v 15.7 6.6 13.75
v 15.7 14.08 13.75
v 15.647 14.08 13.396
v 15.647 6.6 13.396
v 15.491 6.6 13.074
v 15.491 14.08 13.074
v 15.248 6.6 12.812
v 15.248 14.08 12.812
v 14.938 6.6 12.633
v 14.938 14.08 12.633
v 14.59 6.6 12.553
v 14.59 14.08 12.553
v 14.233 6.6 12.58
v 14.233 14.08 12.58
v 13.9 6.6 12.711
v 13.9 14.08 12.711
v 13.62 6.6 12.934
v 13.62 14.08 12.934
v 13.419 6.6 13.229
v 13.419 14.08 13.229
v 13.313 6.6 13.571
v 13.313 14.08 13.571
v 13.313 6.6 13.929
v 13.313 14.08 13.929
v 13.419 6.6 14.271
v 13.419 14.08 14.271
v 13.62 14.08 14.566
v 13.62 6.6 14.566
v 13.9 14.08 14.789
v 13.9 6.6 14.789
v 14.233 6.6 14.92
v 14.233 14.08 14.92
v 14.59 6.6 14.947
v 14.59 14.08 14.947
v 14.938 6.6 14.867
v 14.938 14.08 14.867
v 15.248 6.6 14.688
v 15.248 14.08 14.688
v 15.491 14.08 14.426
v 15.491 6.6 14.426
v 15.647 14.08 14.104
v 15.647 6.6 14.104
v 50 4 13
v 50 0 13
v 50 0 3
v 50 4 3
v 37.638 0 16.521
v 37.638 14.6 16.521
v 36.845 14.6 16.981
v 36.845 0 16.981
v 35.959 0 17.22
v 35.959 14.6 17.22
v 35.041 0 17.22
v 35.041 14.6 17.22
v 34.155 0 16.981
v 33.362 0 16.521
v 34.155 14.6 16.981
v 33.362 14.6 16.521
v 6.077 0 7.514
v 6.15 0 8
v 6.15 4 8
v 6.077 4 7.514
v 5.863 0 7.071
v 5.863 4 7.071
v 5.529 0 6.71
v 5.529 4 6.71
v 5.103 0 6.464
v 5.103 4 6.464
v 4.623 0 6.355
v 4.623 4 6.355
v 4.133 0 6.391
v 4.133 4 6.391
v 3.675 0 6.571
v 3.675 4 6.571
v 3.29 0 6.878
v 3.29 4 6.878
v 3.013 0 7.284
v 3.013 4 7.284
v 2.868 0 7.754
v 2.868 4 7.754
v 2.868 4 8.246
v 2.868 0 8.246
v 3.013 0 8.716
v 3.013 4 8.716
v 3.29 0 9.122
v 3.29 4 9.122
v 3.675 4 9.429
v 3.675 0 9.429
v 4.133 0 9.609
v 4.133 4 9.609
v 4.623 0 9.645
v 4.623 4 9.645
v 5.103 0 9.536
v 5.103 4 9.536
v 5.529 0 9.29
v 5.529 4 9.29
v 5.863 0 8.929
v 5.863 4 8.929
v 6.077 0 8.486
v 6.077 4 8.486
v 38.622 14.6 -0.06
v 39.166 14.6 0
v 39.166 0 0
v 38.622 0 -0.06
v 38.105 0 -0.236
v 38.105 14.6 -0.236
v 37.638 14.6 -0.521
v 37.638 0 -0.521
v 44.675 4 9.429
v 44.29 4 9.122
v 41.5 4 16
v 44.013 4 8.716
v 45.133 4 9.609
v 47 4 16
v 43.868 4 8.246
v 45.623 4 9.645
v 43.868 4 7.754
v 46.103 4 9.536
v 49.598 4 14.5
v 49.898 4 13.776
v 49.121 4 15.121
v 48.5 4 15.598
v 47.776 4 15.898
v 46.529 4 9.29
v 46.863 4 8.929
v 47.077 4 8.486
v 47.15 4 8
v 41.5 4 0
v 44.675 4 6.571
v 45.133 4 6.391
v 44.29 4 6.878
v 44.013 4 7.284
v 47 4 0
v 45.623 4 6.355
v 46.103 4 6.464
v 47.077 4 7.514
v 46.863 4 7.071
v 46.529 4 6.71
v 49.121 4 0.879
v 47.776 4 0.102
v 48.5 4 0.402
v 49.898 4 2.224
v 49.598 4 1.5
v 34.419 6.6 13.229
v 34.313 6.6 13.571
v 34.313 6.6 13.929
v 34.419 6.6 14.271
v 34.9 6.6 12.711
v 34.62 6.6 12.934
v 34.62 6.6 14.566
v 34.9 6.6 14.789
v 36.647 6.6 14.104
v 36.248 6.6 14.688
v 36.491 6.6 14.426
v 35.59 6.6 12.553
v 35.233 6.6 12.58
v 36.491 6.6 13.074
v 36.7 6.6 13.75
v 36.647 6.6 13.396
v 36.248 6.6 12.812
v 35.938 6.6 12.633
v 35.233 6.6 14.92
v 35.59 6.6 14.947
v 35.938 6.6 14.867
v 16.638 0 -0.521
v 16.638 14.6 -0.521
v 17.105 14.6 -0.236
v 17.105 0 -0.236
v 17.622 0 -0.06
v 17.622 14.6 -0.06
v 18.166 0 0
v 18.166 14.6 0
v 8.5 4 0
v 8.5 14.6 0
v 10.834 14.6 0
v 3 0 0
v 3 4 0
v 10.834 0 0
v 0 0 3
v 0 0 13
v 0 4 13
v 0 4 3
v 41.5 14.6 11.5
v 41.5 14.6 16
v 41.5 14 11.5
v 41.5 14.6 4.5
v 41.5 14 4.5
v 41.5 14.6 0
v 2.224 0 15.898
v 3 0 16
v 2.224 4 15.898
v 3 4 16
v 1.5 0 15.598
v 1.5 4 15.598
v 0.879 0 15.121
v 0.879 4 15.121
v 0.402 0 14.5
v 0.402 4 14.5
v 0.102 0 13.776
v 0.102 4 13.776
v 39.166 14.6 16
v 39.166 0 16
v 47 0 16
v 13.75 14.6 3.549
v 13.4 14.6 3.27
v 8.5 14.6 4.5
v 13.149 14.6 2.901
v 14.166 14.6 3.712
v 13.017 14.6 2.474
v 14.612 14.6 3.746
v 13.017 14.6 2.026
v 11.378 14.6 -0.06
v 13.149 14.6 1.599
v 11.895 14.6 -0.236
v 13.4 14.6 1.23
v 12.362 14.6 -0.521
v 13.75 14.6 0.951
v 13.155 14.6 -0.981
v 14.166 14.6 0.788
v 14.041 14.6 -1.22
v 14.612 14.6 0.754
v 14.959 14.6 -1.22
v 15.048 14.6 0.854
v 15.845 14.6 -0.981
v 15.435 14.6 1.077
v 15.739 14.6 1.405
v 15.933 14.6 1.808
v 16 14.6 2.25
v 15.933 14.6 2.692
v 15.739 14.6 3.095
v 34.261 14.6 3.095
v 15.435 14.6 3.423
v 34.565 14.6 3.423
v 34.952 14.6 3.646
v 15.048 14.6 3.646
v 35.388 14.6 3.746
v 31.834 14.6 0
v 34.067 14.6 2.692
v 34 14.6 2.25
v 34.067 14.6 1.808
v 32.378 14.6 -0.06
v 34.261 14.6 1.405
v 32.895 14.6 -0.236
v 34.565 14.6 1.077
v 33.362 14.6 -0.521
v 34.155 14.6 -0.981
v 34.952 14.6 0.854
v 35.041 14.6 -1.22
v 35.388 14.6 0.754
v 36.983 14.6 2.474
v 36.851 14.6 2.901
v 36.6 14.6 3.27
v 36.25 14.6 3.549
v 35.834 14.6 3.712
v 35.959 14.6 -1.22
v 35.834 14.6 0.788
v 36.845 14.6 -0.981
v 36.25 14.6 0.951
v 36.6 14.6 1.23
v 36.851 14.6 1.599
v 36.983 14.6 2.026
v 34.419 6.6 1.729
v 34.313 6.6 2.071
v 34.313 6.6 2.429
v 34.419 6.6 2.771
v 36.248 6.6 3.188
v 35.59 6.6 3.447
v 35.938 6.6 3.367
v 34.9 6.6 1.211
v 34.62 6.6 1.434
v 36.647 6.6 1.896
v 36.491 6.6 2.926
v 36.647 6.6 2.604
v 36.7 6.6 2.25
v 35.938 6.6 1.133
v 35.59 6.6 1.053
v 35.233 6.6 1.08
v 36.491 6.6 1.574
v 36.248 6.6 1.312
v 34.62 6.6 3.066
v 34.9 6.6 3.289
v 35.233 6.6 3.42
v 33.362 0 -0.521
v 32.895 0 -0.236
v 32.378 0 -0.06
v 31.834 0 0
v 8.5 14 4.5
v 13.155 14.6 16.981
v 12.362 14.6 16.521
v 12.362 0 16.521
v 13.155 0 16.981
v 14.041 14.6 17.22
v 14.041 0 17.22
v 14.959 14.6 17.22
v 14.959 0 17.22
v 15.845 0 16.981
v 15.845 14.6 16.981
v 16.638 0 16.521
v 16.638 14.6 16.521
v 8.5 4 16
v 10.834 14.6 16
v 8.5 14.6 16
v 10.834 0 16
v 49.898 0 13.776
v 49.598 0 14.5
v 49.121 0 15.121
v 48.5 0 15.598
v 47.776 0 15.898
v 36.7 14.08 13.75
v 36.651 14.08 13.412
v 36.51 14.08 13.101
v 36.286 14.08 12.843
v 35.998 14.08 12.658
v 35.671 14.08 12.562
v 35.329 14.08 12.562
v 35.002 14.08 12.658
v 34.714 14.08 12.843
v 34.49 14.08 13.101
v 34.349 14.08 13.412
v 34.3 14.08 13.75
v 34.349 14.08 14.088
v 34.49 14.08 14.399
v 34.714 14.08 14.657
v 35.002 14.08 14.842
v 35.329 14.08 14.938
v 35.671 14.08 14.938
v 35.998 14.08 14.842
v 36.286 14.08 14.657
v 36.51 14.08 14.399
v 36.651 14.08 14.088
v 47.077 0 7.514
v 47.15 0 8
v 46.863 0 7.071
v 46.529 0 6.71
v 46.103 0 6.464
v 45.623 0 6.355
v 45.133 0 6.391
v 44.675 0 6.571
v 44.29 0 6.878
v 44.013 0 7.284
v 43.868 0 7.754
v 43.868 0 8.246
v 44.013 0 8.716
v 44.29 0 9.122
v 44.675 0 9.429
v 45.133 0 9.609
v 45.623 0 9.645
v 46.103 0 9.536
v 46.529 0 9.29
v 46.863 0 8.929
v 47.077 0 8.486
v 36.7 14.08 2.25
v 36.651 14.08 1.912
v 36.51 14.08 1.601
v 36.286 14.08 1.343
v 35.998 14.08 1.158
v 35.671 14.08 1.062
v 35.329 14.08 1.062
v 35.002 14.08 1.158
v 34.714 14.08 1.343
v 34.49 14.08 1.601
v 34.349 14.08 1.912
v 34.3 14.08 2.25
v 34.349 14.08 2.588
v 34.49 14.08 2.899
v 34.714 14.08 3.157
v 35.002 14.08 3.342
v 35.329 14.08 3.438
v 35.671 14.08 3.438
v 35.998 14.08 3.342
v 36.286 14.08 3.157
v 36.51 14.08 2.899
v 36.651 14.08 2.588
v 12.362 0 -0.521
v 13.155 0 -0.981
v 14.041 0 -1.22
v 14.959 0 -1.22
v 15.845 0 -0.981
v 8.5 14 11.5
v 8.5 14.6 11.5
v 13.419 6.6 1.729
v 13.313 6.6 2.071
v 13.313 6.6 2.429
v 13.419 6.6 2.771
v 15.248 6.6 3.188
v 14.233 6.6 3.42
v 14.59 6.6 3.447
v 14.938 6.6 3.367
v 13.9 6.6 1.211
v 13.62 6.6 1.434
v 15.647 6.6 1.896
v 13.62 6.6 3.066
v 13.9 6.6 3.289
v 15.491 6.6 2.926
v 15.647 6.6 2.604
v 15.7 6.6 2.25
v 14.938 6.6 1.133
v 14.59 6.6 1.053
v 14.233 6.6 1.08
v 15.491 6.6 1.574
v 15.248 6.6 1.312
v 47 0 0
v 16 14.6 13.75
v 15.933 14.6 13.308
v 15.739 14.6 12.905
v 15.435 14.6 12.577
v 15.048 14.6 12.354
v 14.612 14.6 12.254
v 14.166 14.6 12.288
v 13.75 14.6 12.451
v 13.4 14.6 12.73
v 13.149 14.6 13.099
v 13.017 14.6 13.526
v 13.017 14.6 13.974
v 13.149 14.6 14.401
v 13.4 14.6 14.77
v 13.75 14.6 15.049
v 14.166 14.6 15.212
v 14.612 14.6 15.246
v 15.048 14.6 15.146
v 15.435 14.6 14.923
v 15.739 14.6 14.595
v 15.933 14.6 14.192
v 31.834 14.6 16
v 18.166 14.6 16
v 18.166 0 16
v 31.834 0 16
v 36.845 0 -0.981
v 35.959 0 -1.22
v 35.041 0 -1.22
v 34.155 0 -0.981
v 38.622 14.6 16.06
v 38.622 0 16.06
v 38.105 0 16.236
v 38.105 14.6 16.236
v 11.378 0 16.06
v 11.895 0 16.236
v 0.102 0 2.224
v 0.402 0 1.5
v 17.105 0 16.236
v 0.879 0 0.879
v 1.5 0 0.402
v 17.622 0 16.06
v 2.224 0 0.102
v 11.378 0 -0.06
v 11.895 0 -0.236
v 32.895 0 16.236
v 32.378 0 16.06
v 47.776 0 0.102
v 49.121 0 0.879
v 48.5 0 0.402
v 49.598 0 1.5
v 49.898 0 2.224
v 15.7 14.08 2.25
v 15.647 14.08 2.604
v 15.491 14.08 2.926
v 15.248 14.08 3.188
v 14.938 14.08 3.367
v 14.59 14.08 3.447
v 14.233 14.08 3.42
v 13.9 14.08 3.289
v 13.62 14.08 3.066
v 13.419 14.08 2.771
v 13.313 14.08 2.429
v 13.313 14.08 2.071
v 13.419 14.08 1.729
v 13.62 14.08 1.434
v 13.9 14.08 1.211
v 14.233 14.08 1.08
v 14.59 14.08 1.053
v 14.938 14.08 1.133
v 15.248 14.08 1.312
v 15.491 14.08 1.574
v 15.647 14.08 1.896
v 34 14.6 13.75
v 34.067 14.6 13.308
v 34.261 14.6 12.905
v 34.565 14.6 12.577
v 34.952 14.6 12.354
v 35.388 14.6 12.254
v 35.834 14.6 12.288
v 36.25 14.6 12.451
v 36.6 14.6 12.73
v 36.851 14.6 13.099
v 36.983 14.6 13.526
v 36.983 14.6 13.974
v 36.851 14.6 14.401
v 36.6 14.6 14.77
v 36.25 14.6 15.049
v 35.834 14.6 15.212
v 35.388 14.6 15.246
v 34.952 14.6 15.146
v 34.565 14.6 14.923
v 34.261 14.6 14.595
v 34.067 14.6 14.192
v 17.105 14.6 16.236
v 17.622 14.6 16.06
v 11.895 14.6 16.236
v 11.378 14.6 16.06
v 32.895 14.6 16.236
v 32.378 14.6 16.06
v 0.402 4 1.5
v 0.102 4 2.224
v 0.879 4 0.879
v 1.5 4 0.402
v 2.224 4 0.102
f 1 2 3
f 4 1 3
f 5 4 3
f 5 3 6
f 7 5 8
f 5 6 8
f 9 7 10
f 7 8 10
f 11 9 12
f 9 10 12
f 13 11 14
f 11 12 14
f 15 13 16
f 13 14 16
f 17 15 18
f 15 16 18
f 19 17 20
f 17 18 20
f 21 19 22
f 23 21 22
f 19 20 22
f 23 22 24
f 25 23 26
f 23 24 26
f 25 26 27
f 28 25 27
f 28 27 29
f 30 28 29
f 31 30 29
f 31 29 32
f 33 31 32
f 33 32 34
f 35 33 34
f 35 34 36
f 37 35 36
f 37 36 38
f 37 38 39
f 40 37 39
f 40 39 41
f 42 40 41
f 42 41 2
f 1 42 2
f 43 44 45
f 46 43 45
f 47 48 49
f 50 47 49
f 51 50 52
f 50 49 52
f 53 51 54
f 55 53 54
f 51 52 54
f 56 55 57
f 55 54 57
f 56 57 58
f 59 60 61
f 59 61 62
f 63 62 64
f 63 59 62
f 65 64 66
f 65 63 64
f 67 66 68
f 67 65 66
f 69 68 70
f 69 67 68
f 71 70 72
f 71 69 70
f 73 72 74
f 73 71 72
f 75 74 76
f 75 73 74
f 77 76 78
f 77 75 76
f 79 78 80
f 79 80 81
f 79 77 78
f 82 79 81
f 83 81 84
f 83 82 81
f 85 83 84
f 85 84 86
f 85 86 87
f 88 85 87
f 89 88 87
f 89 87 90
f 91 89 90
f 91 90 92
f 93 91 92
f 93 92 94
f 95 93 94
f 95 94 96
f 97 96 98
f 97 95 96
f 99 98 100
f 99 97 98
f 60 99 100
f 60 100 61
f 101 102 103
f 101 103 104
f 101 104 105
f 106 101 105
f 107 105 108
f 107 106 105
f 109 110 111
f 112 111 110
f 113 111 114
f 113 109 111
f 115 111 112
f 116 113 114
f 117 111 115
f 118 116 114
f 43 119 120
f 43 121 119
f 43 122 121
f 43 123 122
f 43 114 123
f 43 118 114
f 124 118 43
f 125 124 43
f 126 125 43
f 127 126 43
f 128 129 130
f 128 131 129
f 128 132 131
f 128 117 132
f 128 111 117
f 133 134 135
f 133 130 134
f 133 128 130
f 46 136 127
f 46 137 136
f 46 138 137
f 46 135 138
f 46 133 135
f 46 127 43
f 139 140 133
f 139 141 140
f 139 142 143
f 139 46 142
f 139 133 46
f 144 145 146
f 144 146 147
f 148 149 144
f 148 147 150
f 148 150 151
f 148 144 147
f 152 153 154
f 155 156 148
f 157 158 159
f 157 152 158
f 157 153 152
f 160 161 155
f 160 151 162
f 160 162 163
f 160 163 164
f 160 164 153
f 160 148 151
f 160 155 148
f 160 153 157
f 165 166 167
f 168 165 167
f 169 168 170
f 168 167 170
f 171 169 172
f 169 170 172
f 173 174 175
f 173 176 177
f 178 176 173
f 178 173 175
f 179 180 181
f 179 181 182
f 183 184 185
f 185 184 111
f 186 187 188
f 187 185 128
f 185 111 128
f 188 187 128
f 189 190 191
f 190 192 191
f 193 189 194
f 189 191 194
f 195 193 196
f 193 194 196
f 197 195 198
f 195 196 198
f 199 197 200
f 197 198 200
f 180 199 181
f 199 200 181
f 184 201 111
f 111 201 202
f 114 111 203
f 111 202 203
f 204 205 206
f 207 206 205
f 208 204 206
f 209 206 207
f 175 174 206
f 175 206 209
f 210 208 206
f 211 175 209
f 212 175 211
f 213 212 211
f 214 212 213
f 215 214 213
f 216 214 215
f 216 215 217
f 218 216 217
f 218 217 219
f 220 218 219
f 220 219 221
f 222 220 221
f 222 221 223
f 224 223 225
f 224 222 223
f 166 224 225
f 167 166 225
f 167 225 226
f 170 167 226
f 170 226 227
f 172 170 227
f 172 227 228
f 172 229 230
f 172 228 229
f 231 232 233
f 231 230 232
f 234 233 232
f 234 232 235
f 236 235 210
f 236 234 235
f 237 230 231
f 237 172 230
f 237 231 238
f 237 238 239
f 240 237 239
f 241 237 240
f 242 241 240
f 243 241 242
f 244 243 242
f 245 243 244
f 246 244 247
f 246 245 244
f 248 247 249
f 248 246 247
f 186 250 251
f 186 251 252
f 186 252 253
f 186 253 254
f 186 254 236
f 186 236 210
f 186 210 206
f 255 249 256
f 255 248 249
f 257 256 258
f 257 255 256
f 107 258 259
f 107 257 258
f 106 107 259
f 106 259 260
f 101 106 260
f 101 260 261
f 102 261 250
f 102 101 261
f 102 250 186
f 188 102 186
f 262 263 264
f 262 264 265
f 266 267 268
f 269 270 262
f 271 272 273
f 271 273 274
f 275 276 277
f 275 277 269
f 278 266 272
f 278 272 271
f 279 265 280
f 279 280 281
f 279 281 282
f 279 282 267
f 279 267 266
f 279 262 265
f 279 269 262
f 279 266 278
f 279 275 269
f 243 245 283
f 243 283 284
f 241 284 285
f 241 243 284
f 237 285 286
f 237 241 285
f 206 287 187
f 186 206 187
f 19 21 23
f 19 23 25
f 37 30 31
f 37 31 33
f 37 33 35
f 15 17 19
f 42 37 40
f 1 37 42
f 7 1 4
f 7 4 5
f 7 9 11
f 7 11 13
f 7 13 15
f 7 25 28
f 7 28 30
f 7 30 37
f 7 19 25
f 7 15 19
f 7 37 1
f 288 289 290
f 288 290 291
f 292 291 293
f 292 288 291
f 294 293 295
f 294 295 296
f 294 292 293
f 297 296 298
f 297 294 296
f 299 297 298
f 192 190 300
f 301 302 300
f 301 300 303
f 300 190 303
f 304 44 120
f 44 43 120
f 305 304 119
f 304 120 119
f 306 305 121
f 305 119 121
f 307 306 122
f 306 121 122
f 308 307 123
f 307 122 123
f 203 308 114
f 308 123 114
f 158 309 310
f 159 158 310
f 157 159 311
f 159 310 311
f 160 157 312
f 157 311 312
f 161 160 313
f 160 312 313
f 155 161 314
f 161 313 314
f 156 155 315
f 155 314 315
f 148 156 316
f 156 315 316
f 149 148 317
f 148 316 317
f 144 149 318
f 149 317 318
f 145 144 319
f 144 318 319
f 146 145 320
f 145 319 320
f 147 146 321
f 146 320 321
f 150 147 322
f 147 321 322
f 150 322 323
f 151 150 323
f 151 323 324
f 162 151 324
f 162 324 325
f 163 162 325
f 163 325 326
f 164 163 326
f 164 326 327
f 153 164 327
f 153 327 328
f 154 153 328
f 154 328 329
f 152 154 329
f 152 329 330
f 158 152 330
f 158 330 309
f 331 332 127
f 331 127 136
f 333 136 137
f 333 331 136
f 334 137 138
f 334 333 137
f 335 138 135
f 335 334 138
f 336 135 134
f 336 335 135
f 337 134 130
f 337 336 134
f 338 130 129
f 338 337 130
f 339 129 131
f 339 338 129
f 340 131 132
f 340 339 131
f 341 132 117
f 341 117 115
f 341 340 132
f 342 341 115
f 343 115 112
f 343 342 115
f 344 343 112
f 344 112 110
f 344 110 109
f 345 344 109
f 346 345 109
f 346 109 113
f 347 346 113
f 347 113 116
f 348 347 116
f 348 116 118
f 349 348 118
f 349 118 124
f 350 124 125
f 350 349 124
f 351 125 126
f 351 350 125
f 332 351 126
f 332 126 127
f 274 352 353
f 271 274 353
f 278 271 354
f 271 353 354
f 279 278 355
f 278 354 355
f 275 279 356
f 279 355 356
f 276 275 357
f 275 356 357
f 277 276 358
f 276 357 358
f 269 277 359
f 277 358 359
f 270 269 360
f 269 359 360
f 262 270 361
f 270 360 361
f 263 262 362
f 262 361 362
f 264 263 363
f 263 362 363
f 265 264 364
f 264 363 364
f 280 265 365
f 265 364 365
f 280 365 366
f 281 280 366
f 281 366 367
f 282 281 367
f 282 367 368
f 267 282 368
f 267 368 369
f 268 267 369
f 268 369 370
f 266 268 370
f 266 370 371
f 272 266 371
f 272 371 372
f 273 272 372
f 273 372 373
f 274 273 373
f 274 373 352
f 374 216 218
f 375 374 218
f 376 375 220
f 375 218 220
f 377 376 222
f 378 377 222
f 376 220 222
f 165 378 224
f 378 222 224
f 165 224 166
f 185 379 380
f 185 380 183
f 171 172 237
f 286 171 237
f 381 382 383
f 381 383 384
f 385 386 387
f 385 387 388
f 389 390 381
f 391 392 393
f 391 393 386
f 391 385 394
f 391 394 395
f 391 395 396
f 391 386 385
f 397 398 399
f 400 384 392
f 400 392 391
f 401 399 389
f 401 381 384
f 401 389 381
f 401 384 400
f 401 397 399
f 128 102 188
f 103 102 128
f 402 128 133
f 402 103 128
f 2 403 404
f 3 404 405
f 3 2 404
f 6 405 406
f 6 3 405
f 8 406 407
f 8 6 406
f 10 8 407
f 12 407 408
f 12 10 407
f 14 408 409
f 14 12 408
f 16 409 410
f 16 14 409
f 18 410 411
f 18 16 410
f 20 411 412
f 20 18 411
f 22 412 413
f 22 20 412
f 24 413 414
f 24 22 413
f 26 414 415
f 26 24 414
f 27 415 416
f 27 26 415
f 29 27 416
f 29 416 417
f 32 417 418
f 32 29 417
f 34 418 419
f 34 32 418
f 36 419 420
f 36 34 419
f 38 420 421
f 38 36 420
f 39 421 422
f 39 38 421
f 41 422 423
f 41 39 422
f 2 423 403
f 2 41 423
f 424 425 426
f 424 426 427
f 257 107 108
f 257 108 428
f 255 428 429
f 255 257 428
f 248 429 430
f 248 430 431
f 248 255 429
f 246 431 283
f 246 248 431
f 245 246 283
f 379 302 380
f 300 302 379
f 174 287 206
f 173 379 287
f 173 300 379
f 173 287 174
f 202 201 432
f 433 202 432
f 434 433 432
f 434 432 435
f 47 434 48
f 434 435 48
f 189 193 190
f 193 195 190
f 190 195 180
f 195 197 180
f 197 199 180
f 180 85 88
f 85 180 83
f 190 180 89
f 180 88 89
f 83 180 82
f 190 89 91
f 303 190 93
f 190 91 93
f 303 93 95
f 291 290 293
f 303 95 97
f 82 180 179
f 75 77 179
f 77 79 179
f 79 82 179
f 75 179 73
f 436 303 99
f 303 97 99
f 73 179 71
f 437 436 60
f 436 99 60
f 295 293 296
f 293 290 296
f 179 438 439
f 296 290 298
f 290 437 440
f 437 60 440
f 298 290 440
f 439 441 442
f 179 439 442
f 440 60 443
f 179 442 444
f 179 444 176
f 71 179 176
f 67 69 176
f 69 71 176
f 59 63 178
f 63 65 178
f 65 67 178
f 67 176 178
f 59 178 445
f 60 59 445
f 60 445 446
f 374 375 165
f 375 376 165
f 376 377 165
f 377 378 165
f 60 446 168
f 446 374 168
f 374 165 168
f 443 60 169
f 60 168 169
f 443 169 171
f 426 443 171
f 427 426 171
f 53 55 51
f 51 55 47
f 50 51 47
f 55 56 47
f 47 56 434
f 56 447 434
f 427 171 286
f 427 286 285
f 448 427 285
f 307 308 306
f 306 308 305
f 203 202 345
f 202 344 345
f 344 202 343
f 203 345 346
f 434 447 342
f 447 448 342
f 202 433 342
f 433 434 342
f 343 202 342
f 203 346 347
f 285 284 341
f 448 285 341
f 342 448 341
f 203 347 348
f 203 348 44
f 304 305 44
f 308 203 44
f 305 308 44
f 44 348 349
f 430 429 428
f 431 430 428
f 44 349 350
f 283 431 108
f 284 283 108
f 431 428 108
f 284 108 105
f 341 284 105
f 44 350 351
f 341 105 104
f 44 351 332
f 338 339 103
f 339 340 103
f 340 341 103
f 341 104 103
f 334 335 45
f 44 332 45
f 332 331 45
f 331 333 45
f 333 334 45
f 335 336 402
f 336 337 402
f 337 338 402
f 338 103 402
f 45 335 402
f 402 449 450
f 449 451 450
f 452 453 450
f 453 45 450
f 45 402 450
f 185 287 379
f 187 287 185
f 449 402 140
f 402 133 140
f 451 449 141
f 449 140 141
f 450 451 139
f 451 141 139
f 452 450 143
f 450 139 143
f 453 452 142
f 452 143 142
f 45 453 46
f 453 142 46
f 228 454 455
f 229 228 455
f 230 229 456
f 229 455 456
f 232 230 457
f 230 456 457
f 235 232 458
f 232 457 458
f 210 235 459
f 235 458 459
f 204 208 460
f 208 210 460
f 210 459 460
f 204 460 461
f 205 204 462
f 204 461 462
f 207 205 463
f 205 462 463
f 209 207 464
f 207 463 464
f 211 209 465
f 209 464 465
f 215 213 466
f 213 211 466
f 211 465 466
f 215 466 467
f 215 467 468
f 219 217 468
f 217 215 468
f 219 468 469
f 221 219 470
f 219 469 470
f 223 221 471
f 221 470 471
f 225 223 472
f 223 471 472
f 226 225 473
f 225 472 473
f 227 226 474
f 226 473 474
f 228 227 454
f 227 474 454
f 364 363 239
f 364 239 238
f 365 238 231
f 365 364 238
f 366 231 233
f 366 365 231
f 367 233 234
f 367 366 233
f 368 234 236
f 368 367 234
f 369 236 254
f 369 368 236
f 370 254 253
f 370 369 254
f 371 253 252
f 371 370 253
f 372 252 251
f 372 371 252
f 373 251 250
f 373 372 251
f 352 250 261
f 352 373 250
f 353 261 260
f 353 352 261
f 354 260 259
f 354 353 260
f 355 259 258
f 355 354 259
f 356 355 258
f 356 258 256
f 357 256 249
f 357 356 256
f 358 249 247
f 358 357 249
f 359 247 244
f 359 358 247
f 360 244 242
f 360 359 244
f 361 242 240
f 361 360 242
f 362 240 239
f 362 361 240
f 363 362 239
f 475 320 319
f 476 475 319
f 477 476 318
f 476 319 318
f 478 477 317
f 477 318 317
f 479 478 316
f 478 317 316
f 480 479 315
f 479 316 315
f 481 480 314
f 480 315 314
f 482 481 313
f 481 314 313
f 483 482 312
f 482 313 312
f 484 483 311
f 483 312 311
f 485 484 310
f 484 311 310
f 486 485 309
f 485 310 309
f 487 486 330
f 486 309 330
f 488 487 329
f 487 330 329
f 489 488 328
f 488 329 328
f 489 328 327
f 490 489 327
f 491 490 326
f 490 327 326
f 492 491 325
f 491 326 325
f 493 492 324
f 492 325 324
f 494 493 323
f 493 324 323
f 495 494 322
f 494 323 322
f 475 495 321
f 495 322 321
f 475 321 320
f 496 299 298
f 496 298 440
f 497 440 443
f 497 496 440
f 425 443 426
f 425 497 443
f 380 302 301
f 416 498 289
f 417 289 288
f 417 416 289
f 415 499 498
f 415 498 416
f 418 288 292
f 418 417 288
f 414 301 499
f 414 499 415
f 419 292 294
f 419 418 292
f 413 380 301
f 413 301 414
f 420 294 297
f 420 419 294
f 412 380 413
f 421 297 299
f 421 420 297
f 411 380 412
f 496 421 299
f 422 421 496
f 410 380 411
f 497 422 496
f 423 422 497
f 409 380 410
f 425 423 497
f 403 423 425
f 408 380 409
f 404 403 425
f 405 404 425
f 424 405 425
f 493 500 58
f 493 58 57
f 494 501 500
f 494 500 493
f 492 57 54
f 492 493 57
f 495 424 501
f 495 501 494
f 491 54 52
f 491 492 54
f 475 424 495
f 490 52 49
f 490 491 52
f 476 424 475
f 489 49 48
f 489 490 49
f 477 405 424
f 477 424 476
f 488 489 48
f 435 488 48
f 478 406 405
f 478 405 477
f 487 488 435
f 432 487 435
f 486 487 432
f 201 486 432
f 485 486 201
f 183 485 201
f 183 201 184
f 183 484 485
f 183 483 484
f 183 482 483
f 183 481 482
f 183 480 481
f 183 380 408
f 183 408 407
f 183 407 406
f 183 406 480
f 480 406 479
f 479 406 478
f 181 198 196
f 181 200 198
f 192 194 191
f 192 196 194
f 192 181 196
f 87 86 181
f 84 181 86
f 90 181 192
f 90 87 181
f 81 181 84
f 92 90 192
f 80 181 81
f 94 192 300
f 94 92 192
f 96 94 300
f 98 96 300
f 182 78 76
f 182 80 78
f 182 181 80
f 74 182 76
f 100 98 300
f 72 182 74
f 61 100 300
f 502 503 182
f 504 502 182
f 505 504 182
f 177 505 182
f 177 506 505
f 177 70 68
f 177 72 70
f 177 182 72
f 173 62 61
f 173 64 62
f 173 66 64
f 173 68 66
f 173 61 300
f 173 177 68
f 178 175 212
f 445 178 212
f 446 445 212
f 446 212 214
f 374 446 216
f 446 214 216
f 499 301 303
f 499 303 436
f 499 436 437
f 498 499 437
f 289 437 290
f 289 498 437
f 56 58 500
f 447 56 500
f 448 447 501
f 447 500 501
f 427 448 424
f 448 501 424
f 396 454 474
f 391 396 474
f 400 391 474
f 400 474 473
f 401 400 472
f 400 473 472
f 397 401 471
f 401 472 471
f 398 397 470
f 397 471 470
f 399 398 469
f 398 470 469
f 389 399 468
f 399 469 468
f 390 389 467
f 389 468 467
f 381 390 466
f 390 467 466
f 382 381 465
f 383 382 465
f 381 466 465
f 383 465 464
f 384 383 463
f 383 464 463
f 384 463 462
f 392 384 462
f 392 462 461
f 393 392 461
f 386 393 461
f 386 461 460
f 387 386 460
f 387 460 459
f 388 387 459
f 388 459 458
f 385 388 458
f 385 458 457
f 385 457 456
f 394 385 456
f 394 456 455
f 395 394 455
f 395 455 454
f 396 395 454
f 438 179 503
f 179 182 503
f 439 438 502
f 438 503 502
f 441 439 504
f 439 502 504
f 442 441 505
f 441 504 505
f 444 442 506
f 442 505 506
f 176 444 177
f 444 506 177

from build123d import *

# Parameters (mm, degrees)
CROQUIS1_W                = 50
CROQUIS1_H                = 16
CROQUIS1_R                = 1.65
SALIENTE_EXTRUIR1_DEPTH   = 4
CROQUIS2_W                = 33
CROQUIS2_H                = 16
SALIENTE_EXTRUIR2_DEPTH   = 10
CROQUIS3_W                = 33
CROQUIS3_H                = 4.5
SALIENTE_EXTRUIR3_DEPTH   = 0.6
CROQUIS4_R                = 1.2
CORTAR_EXTRUIR1_DEPTH     = 8
SALIENTE_EXTRUIR5_DEPTH   = 14.6
SIMETR_A2_COPY_1_DEPTH    = 14.6
REDONDEO1_R               = 3
REDONDEO2_R               = 3
REDONDEO3_R               = 3
REDONDEO4_R               = 3
CROQUIS6_R                = 1.5
CORTAR_EXTRUIR2_DEPTH     = 0.6
CORTAR_EXTRUIR2_TAPER     = 30
SIMETR_A6_COPY_1_SKETCH_R = 1.5
SIMETR_A6_COPY_1_DEPTH    = 0.6
SIMETR_A6_COPY_1_TAPER    = 30


with BuildPart() as part:
    # Croquis1 → Saliente-Extruir1 (new body)
    with BuildSketch(Plane(origin=(0, 0, 0), x_dir=(1, 0, 0), z_dir=(0, 1, 0))):
        with Locations((25, -8)):
            Rectangle(CROQUIS1_W, CROQUIS1_H)
        with Locations((4.5, -8)):
            Circle(CROQUIS1_R, mode=Mode.SUBTRACT)
        with Locations((45.5, -8)):
            Circle(CROQUIS1_R, mode=Mode.SUBTRACT)
    extrude(amount=SALIENTE_EXTRUIR1_DEPTH)

    # Croquis2 → Saliente-Extruir2 (add)
    with BuildSketch(Plane(origin=(0, 4, 0), x_dir=(1, 0, 0), z_dir=(0, 1, 0))):
        with Locations((25, -8)):
            Rectangle(CROQUIS2_W, CROQUIS2_H)
    extrude(amount=SALIENTE_EXTRUIR2_DEPTH)

    # Croquis3 → Saliente-Extruir3 (add)
    with BuildSketch(Plane(origin=(0, 14, 0), x_dir=(1, 0, 0), z_dir=(0, 1, 0))):
        with Locations((25, -2.25)):
            Rectangle(CROQUIS3_W, CROQUIS3_H)
        with Locations((25, -13.75)):
            Rectangle(CROQUIS3_W, CROQUIS3_H)
    extrude(amount=SALIENTE_EXTRUIR3_DEPTH)

    # Croquis4 → Cortar-Extruir1 (cut)
    with BuildSketch(Plane(origin=(0, 14.6, 0), x_dir=(1, 0, 0), z_dir=(0, 1, 0))):
        with Locations((14.5, -13.75)):
            Circle(CROQUIS4_R)
        with Locations((14.5, -2.25)):
            Circle(CROQUIS4_R)
        with Locations((35.5, -13.75)):
            Circle(CROQUIS4_R)
        with Locations((35.5, -2.25)):
            Circle(CROQUIS4_R)
    extrude(amount=-CORTAR_EXTRUIR1_DEPTH, mode=Mode.SUBTRACT)

    # Croquis5 → Saliente-Extruir5 (add)
    with BuildSketch(Plane(origin=(0, 14.6, 0), x_dir=(1, 0, 0), z_dir=(0, 1, 0))):
        with BuildLine():
            Line((18.165719575, -16), (10.834280425, -16))
            ThreePointArc((10.834280425, -16), (11.641151956, -16.133788189), (12.361663581, -16.520833333))
            ThreePointArc((12.361663581, -16.520833333), (14.5, -17.25), (16.638336419, -16.520833333))
            ThreePointArc((16.638336419, -16.520833333), (17.358848044, -16.133788189), (18.165719575, -16))
        make_face()
    saliente_extruir5 = extrude(amount=-SALIENTE_EXTRUIR5_DEPTH)

    # Simetría1: Saliente-Extruir5 across plane
    add(saliente_extruir5.mirror(Plane.ZY.offset(-25)))

    # Simetría2: Saliente-Extruir5 across plane
    add(saliente_extruir5.mirror(Plane.XY.offset(8)))

    # Simetría2 copy 1 sketch → Simetría2 copy 1 (add)
    with BuildSketch(Plane(origin=(50, 14.6, 16), x_dir=(-1, 0, 0), z_dir=(0, 1, 0))):
        with BuildLine():
            Line((18.165719575, -16), (10.834280425, -16))
            ThreePointArc((10.834280425, -16), (11.641151956, -16.133788189), (12.361663581, -16.520833333))
            ThreePointArc((12.361663581, -16.520833333), (14.5, -17.25), (16.638336419, -16.520833333))
            ThreePointArc((16.638336419, -16.520833333), (17.358848044, -16.133788189), (18.165719575, -16))
        make_face()
    extrude(amount=-SIMETR_A2_COPY_1_DEPTH)

    # Redondeo1
    redondeo1_edges = [part.edges().sort_by_distance(p)[0] for p in [
        (0, 2, 16),
    ]]
    fillet(redondeo1_edges, radius=REDONDEO1_R)

    # Redondeo2
    redondeo2_edges = [part.edges().sort_by_distance(p)[0] for p in [
        (0, 2, 0),
    ]]
    fillet(redondeo2_edges, radius=REDONDEO2_R)

    # Redondeo3
    redondeo3_edges = [part.edges().sort_by_distance(p)[0] for p in [
        (50, 2, 0),
    ]]
    fillet(redondeo3_edges, radius=REDONDEO3_R)

    # Redondeo4
    redondeo4_edges = [part.edges().sort_by_distance(p)[0] for p in [
        (50, 2, 16),
    ]]
    fillet(redondeo4_edges, radius=REDONDEO4_R)

    # Croquis6 → Cortar-Extruir2 (cut)
    with BuildSketch(Plane(origin=(0, 14.6, 0), x_dir=(1, 0, 0), z_dir=(0, 1, 0))):
        with Locations((14.5, -13.75)):
            Circle(CROQUIS6_R)
    cortar_extruir2 = extrude(amount=-CORTAR_EXTRUIR2_DEPTH, taper=CORTAR_EXTRUIR2_TAPER, mode=Mode.SUBTRACT)

    # Simetría5: Cortar-Extruir2 across plane
    add(cortar_extruir2.mirror(Plane.ZY.offset(-25)), mode=Mode.SUBTRACT)

    # Simetría6: Cortar-Extruir2 across plane
    add(cortar_extruir2.mirror(Plane.XY.offset(8)), mode=Mode.SUBTRACT)

    # Simetría6 copy 1 sketch → Simetría6 copy 1 (cut)
    with BuildSketch(Plane(origin=(50, 14.6, 16), x_dir=(-1, 0, 0), z_dir=(0, 1, 0))):
        with Locations((14.5, -13.75)):
            Circle(SIMETR_A6_COPY_1_SKETCH_R)
    extrude(amount=-SIMETR_A6_COPY_1_DEPTH, taper=SIMETR_A6_COPY_1_TAPER, mode=Mode.SUBTRACT)


solid = part.part
